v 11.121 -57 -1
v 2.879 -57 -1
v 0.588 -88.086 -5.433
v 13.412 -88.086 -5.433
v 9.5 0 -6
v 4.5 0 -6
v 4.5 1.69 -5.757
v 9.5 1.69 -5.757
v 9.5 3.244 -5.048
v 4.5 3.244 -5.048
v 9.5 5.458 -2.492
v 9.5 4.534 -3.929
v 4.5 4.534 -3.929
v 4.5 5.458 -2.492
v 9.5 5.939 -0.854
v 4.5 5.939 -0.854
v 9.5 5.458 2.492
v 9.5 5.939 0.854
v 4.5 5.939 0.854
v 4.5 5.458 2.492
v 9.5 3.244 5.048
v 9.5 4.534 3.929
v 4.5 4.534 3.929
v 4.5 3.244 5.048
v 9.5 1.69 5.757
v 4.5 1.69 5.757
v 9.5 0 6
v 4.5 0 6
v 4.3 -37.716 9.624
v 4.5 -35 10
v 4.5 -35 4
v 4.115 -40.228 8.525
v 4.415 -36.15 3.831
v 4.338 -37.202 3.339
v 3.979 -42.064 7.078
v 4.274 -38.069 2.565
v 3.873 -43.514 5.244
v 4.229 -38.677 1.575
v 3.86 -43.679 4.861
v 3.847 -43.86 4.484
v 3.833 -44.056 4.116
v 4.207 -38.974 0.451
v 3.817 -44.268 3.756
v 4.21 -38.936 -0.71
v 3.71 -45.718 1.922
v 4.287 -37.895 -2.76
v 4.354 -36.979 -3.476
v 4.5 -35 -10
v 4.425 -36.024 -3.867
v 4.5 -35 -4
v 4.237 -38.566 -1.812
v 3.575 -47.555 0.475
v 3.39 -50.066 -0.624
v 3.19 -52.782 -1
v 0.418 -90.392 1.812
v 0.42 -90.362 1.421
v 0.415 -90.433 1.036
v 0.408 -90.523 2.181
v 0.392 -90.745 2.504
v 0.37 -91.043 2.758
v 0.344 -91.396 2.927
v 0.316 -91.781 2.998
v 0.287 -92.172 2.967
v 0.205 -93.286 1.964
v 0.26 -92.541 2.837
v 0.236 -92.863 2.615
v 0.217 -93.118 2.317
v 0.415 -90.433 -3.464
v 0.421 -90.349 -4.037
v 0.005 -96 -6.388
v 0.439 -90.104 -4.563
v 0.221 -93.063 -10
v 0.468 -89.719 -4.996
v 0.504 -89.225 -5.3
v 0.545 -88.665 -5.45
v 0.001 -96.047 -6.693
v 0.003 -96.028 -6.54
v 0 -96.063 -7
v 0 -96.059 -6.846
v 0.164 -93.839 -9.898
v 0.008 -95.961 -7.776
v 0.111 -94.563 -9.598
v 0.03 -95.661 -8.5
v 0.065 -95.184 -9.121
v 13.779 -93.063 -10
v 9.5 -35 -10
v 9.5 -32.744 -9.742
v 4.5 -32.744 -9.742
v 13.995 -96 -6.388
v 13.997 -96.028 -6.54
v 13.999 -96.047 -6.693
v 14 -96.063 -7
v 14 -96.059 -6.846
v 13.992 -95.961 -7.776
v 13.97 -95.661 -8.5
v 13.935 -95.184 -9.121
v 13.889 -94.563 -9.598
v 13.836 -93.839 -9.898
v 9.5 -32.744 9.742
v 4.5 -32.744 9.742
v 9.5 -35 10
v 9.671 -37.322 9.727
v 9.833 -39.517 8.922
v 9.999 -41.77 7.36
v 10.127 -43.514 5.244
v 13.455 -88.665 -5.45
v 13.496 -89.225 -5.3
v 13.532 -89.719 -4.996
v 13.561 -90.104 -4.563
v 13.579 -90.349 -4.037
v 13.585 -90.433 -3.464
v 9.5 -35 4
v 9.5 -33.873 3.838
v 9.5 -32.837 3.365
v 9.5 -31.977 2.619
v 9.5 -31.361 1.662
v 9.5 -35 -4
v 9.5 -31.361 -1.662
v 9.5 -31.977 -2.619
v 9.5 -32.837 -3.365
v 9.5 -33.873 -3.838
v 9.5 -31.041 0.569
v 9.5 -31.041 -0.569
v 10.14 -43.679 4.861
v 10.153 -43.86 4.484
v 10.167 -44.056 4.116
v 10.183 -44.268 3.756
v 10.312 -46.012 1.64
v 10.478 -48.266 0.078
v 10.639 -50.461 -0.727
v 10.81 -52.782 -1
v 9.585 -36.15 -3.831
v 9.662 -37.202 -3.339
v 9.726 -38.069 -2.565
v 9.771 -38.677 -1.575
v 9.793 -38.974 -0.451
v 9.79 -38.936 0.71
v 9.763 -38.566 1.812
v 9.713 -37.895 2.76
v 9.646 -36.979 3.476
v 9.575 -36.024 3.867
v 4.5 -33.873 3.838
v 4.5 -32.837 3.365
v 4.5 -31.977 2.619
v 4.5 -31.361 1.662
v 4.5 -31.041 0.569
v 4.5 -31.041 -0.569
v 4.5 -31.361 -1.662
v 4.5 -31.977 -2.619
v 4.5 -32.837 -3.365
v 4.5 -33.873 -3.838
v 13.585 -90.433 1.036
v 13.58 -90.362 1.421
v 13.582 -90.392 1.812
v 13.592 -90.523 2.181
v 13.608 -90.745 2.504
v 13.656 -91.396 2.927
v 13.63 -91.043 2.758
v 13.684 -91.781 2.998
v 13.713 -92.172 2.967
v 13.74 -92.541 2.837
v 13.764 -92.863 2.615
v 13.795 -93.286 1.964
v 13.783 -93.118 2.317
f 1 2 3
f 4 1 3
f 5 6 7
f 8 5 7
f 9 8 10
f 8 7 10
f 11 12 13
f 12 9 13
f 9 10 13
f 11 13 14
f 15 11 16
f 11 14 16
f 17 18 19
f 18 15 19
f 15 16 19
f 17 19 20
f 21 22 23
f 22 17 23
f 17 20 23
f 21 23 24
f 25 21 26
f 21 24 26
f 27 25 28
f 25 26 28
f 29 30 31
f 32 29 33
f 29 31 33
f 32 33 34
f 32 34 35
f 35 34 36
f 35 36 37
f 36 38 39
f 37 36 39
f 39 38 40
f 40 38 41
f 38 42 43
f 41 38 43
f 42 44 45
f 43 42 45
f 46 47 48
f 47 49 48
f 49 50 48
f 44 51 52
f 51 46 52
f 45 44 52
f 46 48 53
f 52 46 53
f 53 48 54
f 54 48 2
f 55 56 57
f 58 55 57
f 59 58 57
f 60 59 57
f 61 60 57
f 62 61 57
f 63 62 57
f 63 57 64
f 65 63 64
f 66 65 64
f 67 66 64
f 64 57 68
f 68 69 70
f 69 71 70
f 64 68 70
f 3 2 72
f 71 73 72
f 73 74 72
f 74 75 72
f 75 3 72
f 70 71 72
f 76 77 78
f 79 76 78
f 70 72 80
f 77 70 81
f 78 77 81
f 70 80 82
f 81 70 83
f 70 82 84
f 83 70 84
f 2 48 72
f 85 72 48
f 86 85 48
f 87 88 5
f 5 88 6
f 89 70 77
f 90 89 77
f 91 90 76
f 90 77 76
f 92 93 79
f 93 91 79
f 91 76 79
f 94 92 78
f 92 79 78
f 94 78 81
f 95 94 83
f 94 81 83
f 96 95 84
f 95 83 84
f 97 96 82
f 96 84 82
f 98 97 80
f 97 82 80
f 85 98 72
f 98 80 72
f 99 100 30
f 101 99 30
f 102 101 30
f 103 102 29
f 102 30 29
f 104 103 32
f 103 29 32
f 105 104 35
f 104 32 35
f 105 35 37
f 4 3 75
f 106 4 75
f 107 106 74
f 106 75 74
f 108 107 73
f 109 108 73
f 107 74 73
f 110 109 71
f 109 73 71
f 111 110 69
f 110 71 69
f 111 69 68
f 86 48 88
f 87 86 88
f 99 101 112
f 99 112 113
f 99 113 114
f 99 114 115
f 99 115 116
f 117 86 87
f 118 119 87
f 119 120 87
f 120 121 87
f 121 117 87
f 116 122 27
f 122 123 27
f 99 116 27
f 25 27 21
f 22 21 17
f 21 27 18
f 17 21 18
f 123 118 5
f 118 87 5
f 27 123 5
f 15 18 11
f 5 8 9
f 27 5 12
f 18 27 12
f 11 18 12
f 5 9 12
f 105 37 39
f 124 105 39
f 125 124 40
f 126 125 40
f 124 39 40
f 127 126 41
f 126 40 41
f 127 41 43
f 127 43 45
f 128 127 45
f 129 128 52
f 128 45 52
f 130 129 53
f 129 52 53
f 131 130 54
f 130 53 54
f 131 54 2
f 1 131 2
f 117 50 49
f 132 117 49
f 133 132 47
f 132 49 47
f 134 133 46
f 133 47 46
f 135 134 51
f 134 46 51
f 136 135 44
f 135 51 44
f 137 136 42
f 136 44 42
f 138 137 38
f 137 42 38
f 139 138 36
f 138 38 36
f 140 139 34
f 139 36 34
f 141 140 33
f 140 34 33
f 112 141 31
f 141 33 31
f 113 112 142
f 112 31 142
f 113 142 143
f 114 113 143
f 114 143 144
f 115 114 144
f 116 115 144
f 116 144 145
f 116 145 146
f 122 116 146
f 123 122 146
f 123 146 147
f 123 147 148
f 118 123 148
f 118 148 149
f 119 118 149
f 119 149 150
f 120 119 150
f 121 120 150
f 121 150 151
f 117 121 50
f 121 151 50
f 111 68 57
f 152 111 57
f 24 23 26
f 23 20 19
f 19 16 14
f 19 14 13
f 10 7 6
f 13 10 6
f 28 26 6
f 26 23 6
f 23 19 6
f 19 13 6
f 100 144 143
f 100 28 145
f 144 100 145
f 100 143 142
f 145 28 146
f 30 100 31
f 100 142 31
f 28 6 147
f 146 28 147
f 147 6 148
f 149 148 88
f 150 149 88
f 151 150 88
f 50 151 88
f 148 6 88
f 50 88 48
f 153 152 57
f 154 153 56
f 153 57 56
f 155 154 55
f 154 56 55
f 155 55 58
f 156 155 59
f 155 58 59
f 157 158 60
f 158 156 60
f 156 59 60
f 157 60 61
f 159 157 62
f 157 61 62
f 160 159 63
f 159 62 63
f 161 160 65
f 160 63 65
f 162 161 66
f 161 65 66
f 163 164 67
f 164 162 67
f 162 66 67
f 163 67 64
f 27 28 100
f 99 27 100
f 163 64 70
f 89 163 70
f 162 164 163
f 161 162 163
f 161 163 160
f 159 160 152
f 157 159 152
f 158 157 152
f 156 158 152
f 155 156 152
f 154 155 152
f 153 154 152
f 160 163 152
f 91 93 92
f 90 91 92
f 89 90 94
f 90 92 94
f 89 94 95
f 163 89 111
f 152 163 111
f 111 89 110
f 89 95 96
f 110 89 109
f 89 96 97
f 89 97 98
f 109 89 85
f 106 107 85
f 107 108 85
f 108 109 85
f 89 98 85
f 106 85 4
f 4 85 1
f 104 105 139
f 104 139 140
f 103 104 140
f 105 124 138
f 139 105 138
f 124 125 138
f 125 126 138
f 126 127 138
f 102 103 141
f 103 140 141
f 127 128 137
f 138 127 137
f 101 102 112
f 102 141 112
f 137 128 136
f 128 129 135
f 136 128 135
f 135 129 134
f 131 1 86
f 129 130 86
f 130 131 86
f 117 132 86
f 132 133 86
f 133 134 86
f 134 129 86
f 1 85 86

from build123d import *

# Parameters (mm, degrees)
BOSS_EXTRUDE1_DEPTH = 14
SKETCH5_OUTSIDE_W   = 36.988
SKETCH5_OUTSIDE_H   = 125.051
CUT_EXTRUDE1_DEPTH  = 100.116594104


with BuildPart() as part:
    # Sketch2 → Boss-Extrude1 (new body)
    with BuildSketch(Plane(origin=(0, 0, 0), x_dir=(0, 0, -1), z_dir=(1, 0, 0))):
        with BuildLine():
            ThreePointArc((6, 0), (0, 6), (-6, 0))
            Line((-6, 0), (-9.742143433, -32.743755036))
            ThreePointArc((-9.742143433, -32.743755036), (0, -25), (9.742143433, -32.743755036))
            Line((9.742143433, -32.743755036), (6, 0))
        make_face()
        with BuildLine():
            ThreePointArc((9.742143433, -32.743755036), (0, -25), (-9.742143433, -32.743755036))
            Line((-9.742143433, -32.743755036), (-10, -35))
            Line((-10, -35), (-4, -35))
            ThreePointArc((-4, -35), (0, -31), (4, -35))
            Line((4, -35), (10, -35))
            Line((10, -35), (9.742143433, -32.743755036))
        make_face()
        with BuildLine():
            Line((-4, -35), (-10, -35))
            ThreePointArc((-10, -35), (-8.730548592, -39.876219979), (-5.244495744, -43.514415094))
            Line((-5.244495744, -43.514415094), (10, -35))
            Line((10, -35), (4, -35))
            ThreePointArc((4, -35), (0, -39), (-4, -35))
        make_face()
        with BuildLine():
            Line((10, -57), (10, -35))
            ThreePointArc((10, -35), (5.587707823, -43.293221406), (-3.755504256, -44.268019626))
            ThreePointArc((-3.755504256, -44.268019626), (-0.269451408, -47.906214741), (1, -52.78243472))
            Line((1, -52.78243472), (1, -57))
            Line((1, -57), (5.433108836, -88.085634368))
            ThreePointArc((5.433108836, -88.085634368), (4.995673886, -89.718617368), (3.463525492, -90.433113071))
            Line((3.463525492, -90.433113071), (-1.036474508, -90.433113071))
            ThreePointArc((-1.036474508, -90.433113071), (-2.926584774, -91.396172354), (-1.963525492, -93.28628262))
            Line((-1.963525492, -93.28628262), (6.388437813, -96))
            ThreePointArc((6.388437813, -96), (8.892790723, -95.390514833), (10, -93.062996137))
            Line((10, -93.062996137), (10, -57))
        make_face()
        with BuildLine():
            Line((10, -35), (-5.244495744, -43.514415094))
            ThreePointArc((-5.244495744, -43.514415094), (-4.484252006, -43.860102062), (-3.755504256, -44.268019626))
            ThreePointArc((-3.755504256, -44.268019626), (5.587707823, -43.293221406), (10, -35))
        make_face()
    extrude(amount=BOSS_EXTRUDE1_DEPTH)

    # Sketch5 outside → Cut-Extrude1 (cut, through all)
    with BuildSketch(Plane(origin=(0, 0, -10), x_dir=(-1, 0, 0), z_dir=(0, 0, -1))):
        with Locations((-7, -45.0315)):
            Rectangle(SKETCH5_OUTSIDE_W, SKETCH5_OUTSIDE_H)
        Polygon((0, -96.062996137), (-14, -96.062996137), (-9.5, -35), (-9.5, 6), (-4.5, 6), (-4.5, -35), align=None, mode=Mode.SUBTRACT)
    extrude(amount=-CUT_EXTRUDE1_DEPTH, mode=Mode.SUBTRACT)


solid = part.part
